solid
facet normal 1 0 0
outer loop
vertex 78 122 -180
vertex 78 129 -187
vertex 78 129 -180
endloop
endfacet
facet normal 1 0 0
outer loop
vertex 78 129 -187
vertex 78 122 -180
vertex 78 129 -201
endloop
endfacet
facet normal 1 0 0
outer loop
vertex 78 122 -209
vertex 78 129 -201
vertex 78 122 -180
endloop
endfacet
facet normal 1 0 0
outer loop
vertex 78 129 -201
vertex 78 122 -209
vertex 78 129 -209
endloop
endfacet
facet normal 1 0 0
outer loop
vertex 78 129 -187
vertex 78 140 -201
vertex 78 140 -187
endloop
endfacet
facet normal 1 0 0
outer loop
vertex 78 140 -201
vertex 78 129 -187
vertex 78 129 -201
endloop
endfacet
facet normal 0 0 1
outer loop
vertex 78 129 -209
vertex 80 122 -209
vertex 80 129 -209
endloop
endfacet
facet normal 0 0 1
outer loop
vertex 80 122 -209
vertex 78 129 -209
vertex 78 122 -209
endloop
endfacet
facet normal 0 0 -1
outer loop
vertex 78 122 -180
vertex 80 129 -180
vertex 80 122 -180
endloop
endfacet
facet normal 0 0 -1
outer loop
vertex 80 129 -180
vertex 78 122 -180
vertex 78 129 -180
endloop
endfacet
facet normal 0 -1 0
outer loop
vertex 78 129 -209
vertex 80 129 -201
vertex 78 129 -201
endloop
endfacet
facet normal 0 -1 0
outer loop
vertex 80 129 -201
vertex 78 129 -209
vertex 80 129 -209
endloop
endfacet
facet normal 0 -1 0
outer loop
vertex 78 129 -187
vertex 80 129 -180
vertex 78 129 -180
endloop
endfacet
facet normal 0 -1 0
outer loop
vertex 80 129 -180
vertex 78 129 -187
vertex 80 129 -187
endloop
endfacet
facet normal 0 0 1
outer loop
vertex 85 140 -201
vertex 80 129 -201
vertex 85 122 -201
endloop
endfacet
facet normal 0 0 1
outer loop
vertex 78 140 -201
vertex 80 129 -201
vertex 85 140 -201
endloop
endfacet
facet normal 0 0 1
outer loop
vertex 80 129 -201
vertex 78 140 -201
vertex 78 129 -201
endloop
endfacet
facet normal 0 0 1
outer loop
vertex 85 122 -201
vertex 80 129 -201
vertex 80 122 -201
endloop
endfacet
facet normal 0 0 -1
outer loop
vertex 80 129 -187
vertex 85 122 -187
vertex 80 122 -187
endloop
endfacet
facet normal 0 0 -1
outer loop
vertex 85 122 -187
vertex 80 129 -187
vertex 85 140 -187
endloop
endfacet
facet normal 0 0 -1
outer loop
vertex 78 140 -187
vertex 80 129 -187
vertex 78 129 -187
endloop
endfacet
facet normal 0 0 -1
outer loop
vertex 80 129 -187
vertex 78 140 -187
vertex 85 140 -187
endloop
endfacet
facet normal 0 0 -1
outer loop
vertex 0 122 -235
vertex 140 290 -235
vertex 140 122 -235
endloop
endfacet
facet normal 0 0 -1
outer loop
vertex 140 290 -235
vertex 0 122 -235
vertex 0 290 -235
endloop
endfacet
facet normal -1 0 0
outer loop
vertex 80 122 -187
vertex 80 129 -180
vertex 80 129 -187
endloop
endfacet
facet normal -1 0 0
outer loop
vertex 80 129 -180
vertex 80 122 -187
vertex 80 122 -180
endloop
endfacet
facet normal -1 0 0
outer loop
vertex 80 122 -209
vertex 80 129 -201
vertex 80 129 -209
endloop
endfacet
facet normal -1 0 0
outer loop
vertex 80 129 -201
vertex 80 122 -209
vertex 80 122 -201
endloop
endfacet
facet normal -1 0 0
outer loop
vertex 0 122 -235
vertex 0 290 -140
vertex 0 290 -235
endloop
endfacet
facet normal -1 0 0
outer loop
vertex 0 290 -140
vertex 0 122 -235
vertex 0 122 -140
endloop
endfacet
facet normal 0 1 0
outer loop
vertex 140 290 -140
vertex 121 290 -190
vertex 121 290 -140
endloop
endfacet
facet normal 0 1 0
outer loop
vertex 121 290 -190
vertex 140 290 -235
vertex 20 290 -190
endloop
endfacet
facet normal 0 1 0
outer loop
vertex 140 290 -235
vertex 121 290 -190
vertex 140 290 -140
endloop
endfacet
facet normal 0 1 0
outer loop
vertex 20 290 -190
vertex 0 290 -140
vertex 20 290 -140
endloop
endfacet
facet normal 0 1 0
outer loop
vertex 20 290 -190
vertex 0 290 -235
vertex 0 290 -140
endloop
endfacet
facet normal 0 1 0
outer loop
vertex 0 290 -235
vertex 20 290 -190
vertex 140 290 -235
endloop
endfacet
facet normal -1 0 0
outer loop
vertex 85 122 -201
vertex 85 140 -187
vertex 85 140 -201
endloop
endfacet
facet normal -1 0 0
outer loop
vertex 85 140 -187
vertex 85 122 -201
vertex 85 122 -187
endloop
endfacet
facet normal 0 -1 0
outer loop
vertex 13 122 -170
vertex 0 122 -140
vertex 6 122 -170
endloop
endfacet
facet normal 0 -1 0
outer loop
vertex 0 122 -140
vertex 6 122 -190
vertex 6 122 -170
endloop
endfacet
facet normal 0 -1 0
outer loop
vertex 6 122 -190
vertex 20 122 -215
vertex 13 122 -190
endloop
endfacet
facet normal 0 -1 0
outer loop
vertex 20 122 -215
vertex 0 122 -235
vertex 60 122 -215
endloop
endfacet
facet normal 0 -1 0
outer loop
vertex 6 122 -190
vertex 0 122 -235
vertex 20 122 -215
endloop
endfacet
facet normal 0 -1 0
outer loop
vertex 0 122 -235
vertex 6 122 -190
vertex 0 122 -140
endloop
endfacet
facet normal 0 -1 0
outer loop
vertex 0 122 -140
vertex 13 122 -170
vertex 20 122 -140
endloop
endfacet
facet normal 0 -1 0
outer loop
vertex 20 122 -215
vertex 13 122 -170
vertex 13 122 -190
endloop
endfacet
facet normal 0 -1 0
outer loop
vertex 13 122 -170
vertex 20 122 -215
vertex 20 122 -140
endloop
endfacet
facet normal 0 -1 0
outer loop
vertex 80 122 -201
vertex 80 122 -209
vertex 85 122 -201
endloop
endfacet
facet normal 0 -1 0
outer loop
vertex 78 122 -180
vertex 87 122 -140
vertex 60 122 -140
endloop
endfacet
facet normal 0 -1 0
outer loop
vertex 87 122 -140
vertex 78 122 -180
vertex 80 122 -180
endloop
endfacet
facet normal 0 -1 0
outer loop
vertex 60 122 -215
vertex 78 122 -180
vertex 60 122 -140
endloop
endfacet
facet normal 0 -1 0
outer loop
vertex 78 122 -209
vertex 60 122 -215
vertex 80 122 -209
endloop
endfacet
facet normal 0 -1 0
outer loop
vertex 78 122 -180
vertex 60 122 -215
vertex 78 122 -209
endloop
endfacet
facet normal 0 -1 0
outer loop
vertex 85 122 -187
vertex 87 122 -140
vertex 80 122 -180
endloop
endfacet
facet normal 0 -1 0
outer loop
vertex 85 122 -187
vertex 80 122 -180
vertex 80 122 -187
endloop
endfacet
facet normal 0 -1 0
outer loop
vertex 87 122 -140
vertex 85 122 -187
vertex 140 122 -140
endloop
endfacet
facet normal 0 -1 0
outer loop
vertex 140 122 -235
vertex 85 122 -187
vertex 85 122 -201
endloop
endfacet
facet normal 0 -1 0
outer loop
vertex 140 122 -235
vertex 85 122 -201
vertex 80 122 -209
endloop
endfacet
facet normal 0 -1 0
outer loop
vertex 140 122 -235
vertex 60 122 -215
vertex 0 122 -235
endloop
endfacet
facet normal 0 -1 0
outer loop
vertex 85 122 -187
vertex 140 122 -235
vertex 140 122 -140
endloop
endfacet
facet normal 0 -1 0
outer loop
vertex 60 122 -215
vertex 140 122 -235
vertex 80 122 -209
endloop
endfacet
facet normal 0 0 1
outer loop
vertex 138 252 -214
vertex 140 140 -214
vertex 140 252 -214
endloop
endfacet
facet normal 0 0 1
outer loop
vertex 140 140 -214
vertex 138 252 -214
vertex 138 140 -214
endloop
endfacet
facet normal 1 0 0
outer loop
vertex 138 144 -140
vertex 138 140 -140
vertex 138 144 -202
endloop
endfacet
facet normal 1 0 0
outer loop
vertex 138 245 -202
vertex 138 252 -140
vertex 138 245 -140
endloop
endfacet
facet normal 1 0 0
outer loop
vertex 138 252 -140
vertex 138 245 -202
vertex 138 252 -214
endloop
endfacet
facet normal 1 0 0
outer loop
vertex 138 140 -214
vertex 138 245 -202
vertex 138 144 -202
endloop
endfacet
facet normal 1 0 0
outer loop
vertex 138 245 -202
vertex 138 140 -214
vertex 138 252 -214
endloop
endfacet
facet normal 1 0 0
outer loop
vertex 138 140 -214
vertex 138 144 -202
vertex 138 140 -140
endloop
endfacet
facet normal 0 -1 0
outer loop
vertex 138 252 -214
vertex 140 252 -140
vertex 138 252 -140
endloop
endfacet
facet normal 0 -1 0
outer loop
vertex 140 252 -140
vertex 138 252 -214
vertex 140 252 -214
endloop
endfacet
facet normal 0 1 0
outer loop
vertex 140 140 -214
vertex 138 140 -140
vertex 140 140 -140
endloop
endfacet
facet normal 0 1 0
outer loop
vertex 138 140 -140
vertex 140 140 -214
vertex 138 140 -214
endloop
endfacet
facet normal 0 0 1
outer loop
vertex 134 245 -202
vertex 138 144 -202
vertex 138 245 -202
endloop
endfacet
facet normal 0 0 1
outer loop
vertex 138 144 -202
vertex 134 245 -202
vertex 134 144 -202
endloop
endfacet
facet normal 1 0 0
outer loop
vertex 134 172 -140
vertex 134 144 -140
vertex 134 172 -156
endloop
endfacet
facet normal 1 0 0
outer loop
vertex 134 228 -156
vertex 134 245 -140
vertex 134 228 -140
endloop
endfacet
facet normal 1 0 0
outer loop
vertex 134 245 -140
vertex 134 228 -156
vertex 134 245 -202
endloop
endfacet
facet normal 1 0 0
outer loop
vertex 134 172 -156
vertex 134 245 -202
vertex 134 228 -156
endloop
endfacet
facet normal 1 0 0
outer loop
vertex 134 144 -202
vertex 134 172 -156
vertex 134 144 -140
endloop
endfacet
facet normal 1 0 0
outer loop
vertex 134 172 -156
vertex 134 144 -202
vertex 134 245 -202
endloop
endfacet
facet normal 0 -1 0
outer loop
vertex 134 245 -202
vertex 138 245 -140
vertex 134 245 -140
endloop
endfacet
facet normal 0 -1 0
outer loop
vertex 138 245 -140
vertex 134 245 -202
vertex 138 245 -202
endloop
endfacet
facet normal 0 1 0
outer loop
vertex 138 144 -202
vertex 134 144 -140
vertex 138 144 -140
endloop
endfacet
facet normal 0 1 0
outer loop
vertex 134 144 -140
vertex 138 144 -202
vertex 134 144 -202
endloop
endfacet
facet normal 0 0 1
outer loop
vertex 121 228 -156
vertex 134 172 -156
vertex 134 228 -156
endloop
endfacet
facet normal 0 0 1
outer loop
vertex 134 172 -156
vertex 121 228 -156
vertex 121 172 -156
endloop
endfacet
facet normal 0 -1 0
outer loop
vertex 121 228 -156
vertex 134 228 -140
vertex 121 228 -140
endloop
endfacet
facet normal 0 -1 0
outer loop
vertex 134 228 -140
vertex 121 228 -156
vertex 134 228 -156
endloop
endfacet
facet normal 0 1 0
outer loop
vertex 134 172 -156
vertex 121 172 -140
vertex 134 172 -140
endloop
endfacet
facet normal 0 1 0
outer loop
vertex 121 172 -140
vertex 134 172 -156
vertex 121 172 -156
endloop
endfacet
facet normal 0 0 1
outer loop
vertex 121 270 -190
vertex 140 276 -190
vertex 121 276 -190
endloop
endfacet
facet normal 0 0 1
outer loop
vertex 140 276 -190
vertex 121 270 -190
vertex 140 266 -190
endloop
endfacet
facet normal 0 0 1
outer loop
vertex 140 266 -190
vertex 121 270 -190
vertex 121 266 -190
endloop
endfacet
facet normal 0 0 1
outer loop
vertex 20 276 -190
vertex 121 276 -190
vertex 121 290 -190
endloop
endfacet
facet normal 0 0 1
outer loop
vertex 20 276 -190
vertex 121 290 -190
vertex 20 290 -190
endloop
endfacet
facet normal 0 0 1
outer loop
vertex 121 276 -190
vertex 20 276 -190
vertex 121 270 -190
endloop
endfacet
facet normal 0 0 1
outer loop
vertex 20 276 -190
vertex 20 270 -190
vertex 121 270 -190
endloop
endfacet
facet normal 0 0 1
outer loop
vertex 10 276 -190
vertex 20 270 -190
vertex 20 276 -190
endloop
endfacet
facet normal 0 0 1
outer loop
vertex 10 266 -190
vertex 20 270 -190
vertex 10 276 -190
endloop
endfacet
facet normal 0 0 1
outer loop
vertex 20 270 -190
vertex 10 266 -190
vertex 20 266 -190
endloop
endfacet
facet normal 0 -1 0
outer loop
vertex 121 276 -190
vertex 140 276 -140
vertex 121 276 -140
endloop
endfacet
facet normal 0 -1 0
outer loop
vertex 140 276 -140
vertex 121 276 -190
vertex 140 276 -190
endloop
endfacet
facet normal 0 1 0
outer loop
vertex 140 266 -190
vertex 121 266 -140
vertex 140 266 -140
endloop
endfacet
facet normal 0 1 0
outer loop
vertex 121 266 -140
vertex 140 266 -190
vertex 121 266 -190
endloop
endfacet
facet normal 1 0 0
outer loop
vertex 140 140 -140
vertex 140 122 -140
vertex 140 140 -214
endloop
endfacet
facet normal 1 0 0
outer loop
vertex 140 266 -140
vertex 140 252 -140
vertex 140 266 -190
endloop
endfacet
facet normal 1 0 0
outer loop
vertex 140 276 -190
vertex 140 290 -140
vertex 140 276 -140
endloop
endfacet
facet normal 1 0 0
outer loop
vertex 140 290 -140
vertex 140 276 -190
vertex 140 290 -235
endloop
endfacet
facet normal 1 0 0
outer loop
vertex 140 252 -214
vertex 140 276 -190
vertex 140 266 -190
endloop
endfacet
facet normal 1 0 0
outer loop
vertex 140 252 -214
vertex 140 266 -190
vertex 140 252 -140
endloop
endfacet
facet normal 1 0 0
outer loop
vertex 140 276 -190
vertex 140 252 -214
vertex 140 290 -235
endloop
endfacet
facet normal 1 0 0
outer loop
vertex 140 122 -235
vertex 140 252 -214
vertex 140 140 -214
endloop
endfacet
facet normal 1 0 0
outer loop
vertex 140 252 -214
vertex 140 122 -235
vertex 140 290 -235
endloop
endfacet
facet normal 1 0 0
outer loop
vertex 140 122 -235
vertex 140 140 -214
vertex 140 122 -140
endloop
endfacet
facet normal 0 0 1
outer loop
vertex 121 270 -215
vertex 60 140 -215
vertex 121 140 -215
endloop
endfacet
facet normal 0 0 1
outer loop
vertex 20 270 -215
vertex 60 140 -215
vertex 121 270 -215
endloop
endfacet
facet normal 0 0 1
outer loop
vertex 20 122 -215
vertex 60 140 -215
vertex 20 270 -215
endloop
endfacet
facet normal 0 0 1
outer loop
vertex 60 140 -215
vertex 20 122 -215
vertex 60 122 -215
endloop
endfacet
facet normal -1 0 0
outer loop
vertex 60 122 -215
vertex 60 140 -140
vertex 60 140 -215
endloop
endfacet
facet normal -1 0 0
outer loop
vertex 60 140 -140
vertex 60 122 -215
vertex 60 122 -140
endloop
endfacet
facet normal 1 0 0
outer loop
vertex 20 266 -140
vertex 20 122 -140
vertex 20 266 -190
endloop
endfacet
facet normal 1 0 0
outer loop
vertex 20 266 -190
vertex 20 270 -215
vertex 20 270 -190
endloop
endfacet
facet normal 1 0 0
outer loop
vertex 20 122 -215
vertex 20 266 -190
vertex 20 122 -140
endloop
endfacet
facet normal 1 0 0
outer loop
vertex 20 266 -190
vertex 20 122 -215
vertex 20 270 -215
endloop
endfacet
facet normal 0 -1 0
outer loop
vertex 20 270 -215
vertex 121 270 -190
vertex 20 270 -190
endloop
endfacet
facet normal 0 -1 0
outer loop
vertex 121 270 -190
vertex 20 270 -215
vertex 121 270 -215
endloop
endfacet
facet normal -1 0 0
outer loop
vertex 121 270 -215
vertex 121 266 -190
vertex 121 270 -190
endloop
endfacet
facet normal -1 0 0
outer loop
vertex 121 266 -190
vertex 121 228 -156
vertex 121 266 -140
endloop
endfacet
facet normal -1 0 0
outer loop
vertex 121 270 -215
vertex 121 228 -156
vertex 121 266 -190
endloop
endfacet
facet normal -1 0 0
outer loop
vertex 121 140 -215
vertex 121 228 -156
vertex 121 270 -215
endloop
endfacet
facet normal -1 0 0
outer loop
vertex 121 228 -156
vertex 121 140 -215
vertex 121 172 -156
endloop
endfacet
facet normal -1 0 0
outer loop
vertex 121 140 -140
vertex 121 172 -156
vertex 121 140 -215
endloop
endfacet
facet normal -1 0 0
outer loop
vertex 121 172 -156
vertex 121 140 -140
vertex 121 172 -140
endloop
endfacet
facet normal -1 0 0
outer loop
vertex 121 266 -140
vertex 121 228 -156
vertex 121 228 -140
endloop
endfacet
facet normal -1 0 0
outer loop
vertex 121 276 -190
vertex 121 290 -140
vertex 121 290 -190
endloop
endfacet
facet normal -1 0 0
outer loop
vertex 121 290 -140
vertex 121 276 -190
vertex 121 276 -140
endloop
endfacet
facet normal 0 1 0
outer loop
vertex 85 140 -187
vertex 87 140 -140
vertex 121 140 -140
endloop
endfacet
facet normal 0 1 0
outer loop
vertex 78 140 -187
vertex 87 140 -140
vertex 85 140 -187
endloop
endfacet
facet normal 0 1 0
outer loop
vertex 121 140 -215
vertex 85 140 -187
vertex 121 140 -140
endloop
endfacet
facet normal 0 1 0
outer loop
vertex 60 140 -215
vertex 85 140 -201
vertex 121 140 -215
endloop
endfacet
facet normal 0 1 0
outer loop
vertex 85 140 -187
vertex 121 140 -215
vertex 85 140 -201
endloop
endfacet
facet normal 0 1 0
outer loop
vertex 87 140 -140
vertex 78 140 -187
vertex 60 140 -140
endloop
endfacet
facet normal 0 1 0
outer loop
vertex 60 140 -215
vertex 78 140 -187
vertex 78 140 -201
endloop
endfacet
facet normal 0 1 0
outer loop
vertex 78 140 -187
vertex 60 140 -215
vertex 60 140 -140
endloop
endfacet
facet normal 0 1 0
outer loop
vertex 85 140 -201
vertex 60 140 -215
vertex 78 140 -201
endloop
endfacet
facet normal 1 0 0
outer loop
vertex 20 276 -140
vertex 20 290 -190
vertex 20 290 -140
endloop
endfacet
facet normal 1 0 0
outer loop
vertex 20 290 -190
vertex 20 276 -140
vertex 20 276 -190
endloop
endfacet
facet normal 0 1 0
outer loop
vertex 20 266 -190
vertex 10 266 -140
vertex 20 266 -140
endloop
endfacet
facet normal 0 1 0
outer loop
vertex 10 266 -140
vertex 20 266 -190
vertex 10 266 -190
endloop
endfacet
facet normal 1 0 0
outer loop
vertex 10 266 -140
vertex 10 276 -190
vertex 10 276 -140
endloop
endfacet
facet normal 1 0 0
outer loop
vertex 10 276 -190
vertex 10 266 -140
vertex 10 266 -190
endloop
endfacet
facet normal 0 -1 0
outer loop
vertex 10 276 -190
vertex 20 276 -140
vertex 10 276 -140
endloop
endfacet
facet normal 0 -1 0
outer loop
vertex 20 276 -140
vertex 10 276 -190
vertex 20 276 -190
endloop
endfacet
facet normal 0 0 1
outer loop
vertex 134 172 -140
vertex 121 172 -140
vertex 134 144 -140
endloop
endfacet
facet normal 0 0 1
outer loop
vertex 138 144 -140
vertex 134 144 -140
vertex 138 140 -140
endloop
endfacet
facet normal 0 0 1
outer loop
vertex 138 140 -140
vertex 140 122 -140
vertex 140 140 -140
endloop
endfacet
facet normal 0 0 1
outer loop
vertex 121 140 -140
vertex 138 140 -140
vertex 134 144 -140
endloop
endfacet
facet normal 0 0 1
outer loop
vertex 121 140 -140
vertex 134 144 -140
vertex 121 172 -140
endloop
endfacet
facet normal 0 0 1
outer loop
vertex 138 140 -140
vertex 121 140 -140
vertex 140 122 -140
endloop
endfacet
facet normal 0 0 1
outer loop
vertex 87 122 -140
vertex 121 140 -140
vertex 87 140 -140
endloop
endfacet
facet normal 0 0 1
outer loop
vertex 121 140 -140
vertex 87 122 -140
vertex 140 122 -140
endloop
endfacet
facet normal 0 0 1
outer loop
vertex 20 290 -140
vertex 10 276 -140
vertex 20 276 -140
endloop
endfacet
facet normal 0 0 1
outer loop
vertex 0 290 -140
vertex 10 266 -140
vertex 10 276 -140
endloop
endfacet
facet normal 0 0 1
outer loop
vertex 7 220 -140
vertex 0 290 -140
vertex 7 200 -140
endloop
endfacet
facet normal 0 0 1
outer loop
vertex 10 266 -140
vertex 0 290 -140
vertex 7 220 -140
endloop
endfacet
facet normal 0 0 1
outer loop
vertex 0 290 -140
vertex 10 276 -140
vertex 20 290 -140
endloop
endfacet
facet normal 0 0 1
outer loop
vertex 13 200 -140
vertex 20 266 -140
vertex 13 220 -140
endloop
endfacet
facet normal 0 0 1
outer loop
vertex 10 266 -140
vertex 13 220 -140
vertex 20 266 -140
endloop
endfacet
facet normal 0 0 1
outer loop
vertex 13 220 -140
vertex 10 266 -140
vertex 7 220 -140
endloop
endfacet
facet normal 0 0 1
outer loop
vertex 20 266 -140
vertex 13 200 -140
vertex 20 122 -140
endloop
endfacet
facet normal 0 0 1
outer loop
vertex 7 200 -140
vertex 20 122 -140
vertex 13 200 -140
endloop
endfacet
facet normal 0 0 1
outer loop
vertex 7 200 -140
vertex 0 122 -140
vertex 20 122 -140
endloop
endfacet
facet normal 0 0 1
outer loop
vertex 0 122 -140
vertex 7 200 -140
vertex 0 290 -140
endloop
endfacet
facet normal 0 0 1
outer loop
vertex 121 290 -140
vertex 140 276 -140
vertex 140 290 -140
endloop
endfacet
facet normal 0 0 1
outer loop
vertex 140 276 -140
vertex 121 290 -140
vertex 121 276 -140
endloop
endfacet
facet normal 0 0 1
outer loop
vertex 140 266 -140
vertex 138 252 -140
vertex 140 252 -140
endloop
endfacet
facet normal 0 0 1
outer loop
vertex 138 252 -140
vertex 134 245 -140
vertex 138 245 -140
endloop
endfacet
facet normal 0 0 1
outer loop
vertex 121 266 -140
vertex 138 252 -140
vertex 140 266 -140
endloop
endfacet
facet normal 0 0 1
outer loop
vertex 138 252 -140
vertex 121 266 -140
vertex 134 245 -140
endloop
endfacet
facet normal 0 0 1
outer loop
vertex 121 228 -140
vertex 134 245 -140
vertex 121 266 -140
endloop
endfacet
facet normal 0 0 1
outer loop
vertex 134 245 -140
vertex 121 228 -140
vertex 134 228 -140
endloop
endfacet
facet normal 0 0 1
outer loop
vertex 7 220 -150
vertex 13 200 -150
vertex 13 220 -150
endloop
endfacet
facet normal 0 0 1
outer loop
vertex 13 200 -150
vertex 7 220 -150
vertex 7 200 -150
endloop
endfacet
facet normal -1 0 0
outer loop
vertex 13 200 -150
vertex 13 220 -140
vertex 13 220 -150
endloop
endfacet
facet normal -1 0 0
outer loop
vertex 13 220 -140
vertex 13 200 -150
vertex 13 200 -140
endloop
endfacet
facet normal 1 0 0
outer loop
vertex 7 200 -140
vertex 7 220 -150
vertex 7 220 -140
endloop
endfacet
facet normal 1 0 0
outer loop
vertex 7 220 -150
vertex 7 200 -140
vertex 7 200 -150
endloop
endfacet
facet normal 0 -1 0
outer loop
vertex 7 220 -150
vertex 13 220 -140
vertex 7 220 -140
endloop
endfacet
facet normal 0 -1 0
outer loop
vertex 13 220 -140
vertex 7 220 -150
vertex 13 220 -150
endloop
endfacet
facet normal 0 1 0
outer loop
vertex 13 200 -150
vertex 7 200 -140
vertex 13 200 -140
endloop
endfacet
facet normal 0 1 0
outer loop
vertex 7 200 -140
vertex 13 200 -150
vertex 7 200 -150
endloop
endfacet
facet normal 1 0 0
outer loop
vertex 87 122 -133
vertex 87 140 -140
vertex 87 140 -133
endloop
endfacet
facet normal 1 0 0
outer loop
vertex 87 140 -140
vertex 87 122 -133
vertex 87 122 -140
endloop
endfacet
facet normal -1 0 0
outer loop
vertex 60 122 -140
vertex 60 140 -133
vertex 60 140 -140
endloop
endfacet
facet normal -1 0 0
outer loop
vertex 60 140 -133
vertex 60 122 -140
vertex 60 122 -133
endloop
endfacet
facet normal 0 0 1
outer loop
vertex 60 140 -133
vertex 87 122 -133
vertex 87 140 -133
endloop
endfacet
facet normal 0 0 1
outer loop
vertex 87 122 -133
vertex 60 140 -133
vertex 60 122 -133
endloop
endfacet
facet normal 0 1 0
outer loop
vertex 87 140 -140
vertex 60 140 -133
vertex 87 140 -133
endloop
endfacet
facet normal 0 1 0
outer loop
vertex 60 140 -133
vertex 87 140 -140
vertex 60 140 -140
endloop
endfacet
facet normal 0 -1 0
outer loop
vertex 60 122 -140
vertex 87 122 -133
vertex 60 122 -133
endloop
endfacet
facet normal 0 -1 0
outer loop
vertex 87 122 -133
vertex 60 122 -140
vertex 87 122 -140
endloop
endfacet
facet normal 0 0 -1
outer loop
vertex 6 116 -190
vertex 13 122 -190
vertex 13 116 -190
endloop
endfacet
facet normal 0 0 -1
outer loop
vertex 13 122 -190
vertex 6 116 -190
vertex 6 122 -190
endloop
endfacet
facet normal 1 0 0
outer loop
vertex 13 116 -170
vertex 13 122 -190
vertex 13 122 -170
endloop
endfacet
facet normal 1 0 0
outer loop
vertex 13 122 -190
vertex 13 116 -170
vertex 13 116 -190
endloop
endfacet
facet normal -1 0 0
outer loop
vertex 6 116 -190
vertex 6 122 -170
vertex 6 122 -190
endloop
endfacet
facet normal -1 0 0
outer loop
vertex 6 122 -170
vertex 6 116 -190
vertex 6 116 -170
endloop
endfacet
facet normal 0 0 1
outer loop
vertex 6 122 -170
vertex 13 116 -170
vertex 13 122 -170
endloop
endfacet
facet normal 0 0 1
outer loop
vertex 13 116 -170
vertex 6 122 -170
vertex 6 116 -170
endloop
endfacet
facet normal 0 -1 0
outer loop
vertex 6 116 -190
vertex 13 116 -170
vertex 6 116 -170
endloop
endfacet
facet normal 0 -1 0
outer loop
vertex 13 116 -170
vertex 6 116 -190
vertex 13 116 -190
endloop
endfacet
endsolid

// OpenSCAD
rotate(a=90,v=[0,1,0]) {
difference() {
    union() {
        difference() {
            cube([235,290,80]); // bottom
            
            union() {
                translate([168,20,78])
                cube([53,74,3]);    // nfc
                translate([180,94,78])
                cube([29,35,3]);    // nfc module
                translate([187,122,78])
                cube([14,20,3]);    // nfc line
                
                translate([50,-1,30])
                cube([57,11,5]);    // printer
            }
        }
        
        translate([0,60,80])
        rotate(a=90,v=[0,1,0]) {
            cylinder(r=60,h=140,$fn=50);    // front
        }
        
        difference() {
            translate([0,60,80])
            cube([140,65,60]);  // front2
        }
        
        difference() {
            translate([0,122,80])
            cube([235,168,60]); // back
            
            union() {
                translate([187,122,79])
                cube([14,20,6]);    // nfc line
                
                translate([21,140,138])
                cube([193,112,3]);  // lcd
                translate([35,144,134])
                cube([167,101,5]);  // lcd bottom
                translate([91,172,120])
                cube([65,56,15]);   // lcd module
                translate([97,140,130])
                cube([40,32,10]);    // lcd line
                
                translate([45,266,120])
                cube([145,10,21]);  // back lid
            }
        }
    }
    
    union() {
        translate([20,10,20])
        cube([195,260,40]); // inside bottom
        
        translate([20,10,60])
        cube([113,130,27]); // inside printer
        translate([20,140,60])
        cube([195,130,61]); // inside lcd
        
        translate([45,266,20])
        cube([145,25,101]); // inside back lid
        translate([45,266,10])
        cube([145,10,11]);  // inside bottom lid
        
        translate([-1,-1,-1])
        cube([141,292,142]);
        translate([140,-1,-1])
        cube([96,123,142]);
        
        translate([139,200,7])
        cube([11,20,6]);
    }
}

translate([133,122,60])
cube([7,18,27]);   // 133+7,10+130,60+27

translate([170,116,6])
cube([20,7,7]);

}
